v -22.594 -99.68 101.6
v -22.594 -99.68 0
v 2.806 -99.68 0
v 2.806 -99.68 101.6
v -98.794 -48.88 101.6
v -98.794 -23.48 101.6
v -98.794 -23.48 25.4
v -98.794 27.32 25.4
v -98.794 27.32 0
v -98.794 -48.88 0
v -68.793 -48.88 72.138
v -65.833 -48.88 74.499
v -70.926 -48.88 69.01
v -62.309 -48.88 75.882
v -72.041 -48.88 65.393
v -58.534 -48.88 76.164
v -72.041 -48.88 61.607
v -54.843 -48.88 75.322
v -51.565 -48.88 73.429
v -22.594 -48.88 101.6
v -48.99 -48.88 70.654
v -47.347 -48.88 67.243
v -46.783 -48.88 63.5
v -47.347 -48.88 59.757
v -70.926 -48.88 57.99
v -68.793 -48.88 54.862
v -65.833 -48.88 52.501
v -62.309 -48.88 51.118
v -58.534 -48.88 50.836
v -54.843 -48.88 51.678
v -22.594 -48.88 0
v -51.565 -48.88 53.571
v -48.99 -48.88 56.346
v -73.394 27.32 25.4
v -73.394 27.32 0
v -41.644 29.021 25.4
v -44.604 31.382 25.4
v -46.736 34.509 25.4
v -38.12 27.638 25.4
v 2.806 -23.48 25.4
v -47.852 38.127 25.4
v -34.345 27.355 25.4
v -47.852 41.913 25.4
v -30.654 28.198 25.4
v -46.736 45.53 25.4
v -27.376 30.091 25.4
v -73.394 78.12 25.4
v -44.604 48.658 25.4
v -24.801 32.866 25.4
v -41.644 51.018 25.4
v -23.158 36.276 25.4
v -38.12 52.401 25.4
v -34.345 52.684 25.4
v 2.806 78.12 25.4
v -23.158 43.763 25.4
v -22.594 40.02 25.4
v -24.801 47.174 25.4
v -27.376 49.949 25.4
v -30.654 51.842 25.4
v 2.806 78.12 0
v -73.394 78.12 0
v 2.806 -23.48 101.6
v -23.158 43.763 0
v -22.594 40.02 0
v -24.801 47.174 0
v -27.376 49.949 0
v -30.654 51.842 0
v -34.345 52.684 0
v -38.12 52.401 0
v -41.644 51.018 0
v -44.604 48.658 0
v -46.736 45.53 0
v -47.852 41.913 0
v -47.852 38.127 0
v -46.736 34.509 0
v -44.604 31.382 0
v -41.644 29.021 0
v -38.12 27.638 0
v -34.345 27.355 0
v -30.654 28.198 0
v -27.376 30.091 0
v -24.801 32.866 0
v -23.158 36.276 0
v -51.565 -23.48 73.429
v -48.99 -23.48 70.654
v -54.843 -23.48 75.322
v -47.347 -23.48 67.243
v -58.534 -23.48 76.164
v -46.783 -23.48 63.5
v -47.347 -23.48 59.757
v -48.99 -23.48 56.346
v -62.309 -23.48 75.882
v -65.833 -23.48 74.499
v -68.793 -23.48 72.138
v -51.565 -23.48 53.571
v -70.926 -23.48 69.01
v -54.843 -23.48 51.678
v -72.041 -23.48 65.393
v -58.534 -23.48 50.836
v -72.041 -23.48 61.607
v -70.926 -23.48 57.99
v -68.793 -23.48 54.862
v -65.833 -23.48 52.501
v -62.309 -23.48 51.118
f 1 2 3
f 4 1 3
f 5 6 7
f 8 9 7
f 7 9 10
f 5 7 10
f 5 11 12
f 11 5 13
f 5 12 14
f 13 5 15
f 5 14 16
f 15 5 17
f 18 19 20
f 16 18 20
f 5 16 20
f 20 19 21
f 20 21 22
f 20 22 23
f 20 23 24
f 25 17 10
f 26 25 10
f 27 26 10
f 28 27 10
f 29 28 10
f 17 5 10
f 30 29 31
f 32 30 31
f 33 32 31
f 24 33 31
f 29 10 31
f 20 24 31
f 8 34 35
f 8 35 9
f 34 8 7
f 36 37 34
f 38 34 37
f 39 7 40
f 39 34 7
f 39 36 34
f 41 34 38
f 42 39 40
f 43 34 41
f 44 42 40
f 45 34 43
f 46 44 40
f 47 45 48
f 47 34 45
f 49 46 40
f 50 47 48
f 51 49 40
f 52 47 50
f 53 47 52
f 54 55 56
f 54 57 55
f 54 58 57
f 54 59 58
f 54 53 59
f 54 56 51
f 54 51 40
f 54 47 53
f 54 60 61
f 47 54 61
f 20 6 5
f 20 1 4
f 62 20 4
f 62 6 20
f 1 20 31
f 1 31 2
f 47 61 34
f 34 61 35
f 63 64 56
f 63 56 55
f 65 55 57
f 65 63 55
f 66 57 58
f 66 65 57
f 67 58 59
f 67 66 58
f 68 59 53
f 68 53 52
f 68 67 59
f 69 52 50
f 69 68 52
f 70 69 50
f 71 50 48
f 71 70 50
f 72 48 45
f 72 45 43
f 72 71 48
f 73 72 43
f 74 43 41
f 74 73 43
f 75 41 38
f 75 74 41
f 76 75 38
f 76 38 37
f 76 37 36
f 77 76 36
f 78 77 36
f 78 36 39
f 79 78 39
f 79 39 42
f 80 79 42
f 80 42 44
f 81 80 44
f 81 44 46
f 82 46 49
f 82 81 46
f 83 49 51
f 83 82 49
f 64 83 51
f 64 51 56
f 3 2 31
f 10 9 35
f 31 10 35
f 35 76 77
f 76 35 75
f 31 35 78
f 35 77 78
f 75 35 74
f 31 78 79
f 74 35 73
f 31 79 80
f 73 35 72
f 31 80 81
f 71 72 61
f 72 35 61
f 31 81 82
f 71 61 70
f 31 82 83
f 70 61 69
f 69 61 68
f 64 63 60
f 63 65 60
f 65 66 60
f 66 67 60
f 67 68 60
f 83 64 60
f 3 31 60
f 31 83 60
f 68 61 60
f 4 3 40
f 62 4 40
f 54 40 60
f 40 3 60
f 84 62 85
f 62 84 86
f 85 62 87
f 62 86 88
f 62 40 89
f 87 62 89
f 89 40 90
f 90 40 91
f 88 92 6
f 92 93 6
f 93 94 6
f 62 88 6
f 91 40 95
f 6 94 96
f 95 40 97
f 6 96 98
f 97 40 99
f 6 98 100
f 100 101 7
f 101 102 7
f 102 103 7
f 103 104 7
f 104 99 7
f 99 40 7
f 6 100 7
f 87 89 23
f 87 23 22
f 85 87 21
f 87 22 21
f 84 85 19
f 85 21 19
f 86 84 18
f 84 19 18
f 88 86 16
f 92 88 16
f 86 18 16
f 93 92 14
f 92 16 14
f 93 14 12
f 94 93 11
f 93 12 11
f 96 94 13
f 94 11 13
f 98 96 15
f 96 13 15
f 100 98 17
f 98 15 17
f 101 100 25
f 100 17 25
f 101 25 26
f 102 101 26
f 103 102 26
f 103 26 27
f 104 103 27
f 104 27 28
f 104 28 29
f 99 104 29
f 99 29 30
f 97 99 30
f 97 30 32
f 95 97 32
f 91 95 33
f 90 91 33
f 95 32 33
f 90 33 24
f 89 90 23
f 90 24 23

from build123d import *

# Parameters (mm, degrees)
F0_R     = 12.7
F1_DEPTH = 25.4
F3_DEPTH = 76.2
F4_R     = 12.7
F5_DEPTH = 25.4


with BuildPart() as f1:
    # F0 (on Top) → F1 (new body)
    with BuildSketch(Plane.XY):
        Polygon((2.805811, 78.11977), (-73.394189, 78.11977), (-73.394189, 27.31977), (-98.794189, 27.31977), (-98.794189, -48.88023), (-73.394189, -48.88023), (-22.594189, -48.88023), (-22.594189, -99.68023), (2.805811, -99.68023), (2.805811, -48.88023), align=None)
        with Locations((-35.294189, 40.01977)):
            Circle(F0_R, mode=Mode.SUBTRACT)
    extrude(amount=F1_DEPTH)

    # F2 (on face) → F3 (join)
    with BuildSketch(Plane.XY.offset(25.4)):
        Polygon((2.805811, -23.48023), (-98.794189, -23.48023), (-98.794189, -48.88023), (-22.594189, -48.88023), (-22.594189, -99.68023), (2.805811, -99.68023), align=None)
    extrude(amount=F3_DEPTH)

    # F4 (on face) → F5 (cut)
    with BuildSketch(Plane.XZ.offset(48.88023)):
        with Locations((-59.483197, 63.5)):
            Circle(F4_R)
    extrude(amount=-F5_DEPTH, mode=Mode.SUBTRACT)


solid = f1.part
